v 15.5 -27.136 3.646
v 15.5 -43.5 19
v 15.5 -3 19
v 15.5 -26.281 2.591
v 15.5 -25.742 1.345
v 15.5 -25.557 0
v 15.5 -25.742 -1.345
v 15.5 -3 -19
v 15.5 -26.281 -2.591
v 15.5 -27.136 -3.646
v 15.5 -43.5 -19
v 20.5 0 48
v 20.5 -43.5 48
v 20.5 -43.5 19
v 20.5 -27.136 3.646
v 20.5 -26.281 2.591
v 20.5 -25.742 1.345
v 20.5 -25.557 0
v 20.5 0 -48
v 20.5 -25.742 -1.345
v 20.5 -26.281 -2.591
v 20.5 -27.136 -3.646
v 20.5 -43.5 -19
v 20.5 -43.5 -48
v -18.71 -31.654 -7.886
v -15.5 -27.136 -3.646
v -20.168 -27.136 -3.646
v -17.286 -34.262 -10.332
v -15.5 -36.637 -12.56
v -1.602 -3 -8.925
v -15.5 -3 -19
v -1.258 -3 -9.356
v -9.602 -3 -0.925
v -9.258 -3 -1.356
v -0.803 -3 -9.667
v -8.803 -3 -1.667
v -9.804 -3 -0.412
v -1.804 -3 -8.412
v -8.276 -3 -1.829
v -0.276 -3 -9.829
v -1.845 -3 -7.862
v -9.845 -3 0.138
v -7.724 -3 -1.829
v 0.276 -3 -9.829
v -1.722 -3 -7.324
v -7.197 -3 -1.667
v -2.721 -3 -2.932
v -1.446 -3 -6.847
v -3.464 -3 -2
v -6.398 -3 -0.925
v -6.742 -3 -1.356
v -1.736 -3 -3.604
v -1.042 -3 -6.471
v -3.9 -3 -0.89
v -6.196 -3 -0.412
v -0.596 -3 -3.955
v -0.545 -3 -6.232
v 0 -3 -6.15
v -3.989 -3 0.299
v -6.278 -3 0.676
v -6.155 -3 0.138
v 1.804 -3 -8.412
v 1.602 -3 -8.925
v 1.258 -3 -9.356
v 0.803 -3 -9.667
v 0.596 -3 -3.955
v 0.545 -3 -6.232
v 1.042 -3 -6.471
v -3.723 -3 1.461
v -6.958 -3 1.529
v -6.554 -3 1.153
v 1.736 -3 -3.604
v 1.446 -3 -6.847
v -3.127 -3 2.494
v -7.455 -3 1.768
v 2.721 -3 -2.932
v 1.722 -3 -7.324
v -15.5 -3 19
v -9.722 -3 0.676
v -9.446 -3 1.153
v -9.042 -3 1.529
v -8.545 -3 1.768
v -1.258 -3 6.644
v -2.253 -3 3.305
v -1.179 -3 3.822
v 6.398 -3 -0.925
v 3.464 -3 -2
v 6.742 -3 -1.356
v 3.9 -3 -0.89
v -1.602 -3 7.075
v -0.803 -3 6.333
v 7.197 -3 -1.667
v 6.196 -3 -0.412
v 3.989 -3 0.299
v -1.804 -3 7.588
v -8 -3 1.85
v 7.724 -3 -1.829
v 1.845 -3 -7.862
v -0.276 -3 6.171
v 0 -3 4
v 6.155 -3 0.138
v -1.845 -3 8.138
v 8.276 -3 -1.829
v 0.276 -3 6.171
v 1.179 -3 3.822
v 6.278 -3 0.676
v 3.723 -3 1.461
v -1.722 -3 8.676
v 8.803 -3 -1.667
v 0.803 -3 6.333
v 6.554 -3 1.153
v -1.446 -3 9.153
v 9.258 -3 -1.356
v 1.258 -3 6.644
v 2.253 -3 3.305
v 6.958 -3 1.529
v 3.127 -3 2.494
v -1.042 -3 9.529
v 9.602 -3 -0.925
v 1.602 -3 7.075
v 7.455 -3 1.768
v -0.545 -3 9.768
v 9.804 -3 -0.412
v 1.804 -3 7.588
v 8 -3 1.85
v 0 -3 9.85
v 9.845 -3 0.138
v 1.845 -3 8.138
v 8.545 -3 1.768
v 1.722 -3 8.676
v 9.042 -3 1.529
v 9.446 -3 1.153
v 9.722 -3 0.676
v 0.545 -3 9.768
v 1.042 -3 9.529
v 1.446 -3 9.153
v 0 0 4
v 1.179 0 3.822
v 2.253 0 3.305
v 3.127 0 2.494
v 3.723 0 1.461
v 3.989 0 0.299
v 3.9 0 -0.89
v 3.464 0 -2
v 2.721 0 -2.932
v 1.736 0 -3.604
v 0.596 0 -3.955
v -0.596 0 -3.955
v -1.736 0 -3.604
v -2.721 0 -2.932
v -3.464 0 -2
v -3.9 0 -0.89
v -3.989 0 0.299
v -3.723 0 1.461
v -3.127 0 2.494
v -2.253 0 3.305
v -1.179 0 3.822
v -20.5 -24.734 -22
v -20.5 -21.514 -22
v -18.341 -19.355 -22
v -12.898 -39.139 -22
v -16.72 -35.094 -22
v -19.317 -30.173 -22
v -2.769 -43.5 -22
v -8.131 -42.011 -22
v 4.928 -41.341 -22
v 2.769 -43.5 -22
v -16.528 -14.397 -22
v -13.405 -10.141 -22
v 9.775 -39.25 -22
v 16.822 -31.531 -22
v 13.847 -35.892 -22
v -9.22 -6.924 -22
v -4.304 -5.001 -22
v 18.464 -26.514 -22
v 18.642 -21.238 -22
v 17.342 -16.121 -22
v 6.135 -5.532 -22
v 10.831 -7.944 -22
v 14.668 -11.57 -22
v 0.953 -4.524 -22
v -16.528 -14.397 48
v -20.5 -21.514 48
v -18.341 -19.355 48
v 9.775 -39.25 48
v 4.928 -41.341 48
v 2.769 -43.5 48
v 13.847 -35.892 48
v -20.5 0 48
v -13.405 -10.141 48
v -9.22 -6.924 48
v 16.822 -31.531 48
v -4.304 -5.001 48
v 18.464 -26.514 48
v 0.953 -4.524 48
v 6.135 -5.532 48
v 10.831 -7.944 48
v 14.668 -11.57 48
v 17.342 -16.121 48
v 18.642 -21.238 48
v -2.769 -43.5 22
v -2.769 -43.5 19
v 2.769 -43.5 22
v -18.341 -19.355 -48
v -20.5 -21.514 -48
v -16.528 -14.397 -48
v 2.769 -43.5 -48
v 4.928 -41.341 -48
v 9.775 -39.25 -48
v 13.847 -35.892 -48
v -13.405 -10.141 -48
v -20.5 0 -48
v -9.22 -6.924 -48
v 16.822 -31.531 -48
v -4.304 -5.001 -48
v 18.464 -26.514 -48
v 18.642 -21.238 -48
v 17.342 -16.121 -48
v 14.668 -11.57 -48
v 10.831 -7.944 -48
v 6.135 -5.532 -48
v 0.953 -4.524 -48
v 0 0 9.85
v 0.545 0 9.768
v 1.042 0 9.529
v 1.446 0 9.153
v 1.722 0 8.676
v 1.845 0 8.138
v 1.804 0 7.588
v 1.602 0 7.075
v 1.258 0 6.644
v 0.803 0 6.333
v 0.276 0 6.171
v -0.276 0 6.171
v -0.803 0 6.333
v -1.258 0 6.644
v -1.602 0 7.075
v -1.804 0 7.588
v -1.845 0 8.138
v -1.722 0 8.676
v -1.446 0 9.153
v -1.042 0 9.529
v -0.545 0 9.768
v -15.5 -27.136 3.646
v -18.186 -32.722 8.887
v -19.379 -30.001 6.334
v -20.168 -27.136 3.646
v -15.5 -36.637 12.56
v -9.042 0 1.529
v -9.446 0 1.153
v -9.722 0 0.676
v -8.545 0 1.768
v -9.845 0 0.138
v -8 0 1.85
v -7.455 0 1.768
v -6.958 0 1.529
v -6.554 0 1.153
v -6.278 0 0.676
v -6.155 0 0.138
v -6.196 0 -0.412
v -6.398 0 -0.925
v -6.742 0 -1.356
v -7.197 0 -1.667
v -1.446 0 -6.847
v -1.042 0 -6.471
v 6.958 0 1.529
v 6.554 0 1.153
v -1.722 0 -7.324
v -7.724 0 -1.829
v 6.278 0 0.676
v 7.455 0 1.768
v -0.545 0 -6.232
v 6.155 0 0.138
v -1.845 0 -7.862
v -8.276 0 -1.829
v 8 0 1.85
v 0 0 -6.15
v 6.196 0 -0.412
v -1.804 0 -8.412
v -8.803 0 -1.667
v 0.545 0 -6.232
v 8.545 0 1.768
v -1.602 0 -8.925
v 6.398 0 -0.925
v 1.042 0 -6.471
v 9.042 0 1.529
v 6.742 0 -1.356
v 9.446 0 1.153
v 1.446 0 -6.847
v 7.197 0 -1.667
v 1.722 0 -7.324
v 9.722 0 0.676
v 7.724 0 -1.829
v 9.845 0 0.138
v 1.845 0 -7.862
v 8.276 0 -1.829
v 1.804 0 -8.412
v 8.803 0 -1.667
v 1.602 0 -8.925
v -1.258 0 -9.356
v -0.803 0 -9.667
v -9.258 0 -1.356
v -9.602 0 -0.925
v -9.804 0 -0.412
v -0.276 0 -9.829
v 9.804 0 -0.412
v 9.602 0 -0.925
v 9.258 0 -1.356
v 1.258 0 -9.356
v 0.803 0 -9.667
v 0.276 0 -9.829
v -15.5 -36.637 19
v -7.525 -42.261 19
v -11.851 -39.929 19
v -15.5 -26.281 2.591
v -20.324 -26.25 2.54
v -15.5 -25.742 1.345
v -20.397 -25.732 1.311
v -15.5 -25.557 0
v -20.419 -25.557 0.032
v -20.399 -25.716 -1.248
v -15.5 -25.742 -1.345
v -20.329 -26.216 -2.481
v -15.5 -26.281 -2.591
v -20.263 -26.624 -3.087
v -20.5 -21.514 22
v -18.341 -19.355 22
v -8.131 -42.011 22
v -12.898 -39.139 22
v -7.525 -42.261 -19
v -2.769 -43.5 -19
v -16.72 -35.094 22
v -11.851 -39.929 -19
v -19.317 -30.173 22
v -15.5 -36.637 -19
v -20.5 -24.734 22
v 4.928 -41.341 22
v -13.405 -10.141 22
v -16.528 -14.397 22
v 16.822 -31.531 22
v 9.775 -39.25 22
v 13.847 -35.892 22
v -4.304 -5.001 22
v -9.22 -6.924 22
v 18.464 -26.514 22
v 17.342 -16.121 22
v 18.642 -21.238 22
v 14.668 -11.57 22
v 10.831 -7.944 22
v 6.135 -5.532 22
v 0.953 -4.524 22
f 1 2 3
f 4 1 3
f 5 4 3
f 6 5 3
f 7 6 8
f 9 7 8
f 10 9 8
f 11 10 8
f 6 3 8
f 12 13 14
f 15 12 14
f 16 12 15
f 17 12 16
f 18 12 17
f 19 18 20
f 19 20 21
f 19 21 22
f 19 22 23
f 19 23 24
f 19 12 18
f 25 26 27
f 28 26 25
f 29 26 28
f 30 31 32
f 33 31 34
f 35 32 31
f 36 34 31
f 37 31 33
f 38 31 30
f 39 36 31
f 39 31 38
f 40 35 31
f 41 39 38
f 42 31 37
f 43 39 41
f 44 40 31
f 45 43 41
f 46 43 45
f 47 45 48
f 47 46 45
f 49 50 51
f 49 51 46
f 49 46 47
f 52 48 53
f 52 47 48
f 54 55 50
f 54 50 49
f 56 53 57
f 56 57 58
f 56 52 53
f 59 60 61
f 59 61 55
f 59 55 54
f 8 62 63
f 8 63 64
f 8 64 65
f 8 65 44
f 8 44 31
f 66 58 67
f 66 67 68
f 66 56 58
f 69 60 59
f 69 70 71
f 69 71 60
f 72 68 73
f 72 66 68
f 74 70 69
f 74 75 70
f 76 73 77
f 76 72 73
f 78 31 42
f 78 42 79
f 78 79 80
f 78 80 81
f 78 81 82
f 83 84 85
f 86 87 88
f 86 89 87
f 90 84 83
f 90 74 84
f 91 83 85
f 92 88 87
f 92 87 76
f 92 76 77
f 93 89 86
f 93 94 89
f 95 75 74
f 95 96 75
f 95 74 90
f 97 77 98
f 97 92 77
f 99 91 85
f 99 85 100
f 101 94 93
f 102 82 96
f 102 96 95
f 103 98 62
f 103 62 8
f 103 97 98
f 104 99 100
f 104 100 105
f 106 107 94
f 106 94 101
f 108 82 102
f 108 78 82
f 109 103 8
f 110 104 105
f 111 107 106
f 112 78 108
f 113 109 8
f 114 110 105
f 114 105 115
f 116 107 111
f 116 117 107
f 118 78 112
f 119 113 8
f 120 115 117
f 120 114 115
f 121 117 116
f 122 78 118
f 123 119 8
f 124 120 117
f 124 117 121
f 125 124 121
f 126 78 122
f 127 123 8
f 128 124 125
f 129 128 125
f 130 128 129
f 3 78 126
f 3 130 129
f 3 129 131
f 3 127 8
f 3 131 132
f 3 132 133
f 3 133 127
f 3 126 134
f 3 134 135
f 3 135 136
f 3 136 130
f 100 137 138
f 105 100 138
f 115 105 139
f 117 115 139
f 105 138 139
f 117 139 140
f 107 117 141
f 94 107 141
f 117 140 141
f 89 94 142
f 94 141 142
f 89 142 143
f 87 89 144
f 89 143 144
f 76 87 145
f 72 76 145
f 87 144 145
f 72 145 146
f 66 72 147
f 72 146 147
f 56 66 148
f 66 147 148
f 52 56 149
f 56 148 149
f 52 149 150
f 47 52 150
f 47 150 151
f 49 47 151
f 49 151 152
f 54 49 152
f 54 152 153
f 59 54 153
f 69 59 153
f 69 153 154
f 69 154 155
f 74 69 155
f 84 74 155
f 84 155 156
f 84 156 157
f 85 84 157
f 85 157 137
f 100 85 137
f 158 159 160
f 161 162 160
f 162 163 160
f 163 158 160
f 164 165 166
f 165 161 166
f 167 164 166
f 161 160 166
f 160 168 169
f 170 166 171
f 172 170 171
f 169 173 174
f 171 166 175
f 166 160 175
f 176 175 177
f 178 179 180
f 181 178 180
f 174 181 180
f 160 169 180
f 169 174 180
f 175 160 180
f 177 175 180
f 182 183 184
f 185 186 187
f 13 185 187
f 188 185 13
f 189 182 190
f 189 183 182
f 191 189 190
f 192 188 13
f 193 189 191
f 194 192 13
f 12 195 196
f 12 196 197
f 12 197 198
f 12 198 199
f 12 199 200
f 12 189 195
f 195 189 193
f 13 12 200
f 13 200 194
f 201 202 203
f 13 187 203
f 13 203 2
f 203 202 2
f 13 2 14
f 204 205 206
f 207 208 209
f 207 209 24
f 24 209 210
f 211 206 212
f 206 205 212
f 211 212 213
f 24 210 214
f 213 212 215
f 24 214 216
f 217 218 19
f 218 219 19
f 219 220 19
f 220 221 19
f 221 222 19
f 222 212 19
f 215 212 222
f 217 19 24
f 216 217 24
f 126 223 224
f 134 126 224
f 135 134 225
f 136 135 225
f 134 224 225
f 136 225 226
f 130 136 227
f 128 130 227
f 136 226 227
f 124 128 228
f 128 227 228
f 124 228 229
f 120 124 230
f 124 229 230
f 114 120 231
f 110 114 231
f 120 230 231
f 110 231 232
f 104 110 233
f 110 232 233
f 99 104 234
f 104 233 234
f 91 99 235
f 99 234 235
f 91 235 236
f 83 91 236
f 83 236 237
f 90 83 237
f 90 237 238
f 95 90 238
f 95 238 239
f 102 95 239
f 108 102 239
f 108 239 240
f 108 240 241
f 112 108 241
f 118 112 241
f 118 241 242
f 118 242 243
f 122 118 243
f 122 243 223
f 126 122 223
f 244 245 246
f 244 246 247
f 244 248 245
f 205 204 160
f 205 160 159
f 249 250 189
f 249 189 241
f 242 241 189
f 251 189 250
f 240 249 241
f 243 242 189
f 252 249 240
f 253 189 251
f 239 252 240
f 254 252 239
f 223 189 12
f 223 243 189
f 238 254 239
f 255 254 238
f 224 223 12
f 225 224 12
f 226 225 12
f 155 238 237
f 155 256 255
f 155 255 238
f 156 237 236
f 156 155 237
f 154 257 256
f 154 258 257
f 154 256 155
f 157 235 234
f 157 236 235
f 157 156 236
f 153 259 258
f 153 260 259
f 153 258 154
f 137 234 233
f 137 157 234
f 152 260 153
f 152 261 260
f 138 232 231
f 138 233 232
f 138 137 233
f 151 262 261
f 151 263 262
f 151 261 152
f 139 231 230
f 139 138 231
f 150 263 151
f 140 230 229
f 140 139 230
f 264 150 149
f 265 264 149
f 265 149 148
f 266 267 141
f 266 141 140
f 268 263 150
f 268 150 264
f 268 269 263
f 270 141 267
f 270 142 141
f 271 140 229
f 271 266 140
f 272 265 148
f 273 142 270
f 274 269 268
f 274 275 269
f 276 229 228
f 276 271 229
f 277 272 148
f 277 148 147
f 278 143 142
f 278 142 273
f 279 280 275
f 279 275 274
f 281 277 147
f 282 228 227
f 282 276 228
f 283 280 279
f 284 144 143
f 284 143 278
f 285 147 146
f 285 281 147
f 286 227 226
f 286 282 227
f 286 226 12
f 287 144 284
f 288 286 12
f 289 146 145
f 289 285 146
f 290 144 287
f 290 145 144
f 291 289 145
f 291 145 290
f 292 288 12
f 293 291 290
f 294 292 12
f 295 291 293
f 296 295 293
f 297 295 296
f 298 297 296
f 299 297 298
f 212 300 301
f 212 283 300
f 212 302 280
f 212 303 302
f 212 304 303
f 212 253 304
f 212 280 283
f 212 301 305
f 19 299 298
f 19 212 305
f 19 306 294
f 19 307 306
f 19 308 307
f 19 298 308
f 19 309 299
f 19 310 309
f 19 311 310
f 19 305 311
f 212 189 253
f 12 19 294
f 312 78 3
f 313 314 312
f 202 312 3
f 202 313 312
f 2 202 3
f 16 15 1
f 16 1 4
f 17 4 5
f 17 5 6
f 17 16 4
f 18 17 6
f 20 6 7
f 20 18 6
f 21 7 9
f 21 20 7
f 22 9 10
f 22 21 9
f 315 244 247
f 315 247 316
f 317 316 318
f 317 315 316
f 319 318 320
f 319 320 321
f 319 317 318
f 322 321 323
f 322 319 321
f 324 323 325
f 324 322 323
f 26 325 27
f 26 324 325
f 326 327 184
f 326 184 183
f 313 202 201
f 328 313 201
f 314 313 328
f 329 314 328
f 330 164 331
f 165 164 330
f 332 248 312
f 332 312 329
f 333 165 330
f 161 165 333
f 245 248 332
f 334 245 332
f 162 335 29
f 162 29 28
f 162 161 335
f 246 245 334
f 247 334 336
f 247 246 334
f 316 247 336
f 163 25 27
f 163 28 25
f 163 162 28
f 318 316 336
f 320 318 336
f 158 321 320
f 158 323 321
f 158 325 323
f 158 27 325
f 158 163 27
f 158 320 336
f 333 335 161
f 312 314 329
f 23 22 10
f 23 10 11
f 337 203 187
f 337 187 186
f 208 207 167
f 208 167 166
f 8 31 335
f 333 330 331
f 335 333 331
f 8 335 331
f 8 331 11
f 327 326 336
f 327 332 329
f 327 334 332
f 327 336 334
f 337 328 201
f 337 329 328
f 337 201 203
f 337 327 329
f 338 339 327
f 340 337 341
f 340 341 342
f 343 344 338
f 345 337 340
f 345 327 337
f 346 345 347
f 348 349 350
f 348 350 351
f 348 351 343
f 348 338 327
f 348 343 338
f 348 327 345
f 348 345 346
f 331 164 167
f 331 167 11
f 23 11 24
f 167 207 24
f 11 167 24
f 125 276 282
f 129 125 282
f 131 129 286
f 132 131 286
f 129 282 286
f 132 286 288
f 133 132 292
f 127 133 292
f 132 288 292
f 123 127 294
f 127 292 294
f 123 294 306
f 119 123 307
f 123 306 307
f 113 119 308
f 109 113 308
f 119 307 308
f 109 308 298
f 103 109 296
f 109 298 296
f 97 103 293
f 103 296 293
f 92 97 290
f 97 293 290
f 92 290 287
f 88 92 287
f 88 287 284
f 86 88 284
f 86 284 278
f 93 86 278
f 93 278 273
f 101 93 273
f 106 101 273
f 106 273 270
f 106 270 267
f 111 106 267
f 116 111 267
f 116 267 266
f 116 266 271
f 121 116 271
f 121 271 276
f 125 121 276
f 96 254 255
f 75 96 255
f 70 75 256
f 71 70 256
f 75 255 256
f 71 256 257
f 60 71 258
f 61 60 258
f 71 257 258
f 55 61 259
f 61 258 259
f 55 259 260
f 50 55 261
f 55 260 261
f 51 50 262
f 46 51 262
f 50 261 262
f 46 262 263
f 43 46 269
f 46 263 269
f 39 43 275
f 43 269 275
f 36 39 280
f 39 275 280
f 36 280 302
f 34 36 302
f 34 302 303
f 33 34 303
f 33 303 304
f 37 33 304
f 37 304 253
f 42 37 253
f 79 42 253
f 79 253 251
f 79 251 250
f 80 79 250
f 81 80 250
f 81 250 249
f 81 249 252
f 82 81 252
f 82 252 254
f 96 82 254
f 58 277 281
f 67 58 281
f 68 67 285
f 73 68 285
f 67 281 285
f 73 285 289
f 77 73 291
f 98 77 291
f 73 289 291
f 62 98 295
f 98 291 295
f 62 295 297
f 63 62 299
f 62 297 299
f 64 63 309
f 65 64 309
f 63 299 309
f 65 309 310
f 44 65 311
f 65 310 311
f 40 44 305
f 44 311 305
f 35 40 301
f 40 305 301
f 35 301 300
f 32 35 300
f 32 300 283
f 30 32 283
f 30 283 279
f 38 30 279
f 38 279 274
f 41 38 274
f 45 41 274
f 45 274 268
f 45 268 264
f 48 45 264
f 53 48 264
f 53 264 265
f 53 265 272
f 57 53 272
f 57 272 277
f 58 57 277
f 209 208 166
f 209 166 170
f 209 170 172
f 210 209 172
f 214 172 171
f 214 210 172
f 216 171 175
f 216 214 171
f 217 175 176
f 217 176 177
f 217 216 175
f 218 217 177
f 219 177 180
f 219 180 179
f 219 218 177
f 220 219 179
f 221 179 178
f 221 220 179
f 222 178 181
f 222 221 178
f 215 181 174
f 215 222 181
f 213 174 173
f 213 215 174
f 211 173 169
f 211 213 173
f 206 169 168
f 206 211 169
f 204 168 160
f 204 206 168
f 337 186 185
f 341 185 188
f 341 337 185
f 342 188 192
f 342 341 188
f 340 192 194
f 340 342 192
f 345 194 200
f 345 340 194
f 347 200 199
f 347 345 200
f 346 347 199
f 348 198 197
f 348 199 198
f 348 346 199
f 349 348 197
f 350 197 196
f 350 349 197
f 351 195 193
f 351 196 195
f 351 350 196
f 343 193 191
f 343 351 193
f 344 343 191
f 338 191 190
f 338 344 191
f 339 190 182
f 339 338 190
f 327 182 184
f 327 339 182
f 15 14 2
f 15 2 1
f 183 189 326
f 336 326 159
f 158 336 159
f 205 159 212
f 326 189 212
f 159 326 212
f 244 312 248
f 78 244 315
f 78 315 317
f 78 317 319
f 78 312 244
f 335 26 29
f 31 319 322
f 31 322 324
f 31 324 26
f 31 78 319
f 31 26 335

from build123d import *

# Parameters (mm, degrees)
SKETCH1_W               = 41
SKETCH1_H               = 96
SKETCH1_R               = 4
SKETCH1_R_2             = 1.85
BOSS_EXTRUDE1_DEPTH     = 43.5
CUT_EXTRUDE1_DEPTH      = 108.370852656
CUT_EXTRUDE1_DEPTH_BACK = 26
CUT_EXTRUDE2_START      = -96
CUT_EXTRUDE2_DEPTH      = 26
SKETCH4_W               = 41
SKETCH4_H               = 38
CUT_EXTRUDE4_DEPTH      = 40.5
BOSS_EXTRUDE2_START     = 20.5
BOSS_EXTRUDE2_DEPTH     = 5
BOSS_EXTRUDE3_START     = -15.5
BOSS_EXTRUDE3_DEPTH     = 5
CUT_EXTRUDE5_START      = -44
CUT_EXTRUDE5_DEPTH      = 44


# Read off the part's stored shape, not the designer's step: Cut-Extrude5
with BuildPart() as part:
    # Sketch1 → Boss-Extrude1 (new body)
    with BuildSketch(Plane(origin=(0, 0, 0), x_dir=(1, 0, 0), z_dir=(0, 1, 0))):
        Rectangle(SKETCH1_W, SKETCH1_H)
        with Locations(Location((0, 0, 0), (0, 0, 270))):
            Circle(SKETCH1_R, mode=Mode.SUBTRACT)
        with Locations(Location((0, -8, 0), (0, 0, 270))):
            Circle(SKETCH1_R_2, mode=Mode.SUBTRACT)
        with Locations(Location((-8, 0, 0), (0, 0, 270))):
            Circle(SKETCH1_R_2, mode=Mode.SUBTRACT)
        with Locations(Location((0, 8, 0), (0, 0, 270))):
            Circle(SKETCH1_R_2, mode=Mode.SUBTRACT)
        with Locations(Location((8, 0, 0), (0, 0, 270))):
            Circle(SKETCH1_R_2, mode=Mode.SUBTRACT)
    extrude(amount=-BOSS_EXTRUDE1_DEPTH)

    # Sketch3 → Cut-Extrude1 (cut, two sides: drawn at the far end of the back side and taken through both)
    with BuildSketch(Plane.XY.offset(48).offset(-CUT_EXTRUDE1_DEPTH_BACK)):
        with BuildLine():
            Line((-18.340899032, -19.35462804), (-20.5, -21.513729008))
            Line((-20.5, -21.513729008), (-20.5, -43.5))
            Line((-20.5, -43.5), (2.768563004, -43.5))
            Line((2.768563004, -43.5), (4.927663972, -41.340899032))
            ThreePointArc((4.927663972, -41.340899032), (12.877412268, -9.621546189), (-18.340899032, -19.35462804))
        make_face()
    extrude(amount=CUT_EXTRUDE1_DEPTH + CUT_EXTRUDE1_DEPTH_BACK, mode=Mode.SUBTRACT)

    # Sketch3<4> → Cut-Extrude2 (cut)
    with BuildSketch(Plane.XY.offset(48).offset(CUT_EXTRUDE2_START)):
        with BuildLine():
            Line((-18.340899032, -19.35462804), (-20.5, -21.513729008))
            Line((-20.5, -21.513729008), (-20.5, -43.5))
            Line((-20.5, -43.5), (2.768563004, -43.5))
            Line((2.768563004, -43.5), (4.927663972, -41.340899032))
            ThreePointArc((4.927663972, -41.340899032), (12.877412268, -9.621546189), (-18.340899032, -19.35462804))
        make_face()
    extrude(amount=CUT_EXTRUDE2_DEPTH, mode=Mode.SUBTRACT)

    # Sketch4 → Cut-Extrude4 (cut)
    with BuildSketch(Plane.XZ.offset(43.5)):
        Rectangle(SKETCH4_W, SKETCH4_H)
    extrude(amount=-CUT_EXTRUDE4_DEPTH, mode=Mode.SUBTRACT)

    # Sketch5 → Boss-Extrude2 (add)
    with BuildSketch(Plane(origin=(0, 0, 0), x_dir=(0, 0, -1), z_dir=(1, 0, 0)).offset(BOSS_EXTRUDE2_START)):
        with BuildLine():
            Line((-19, -43.5), (-3.646281893, -27.13616886))
            ThreePointArc((-3.646281893, -27.13616886), (0, -25.557371624), (3.646281893, -27.13616886))
            Line((3.646281893, -27.13616886), (19, -43.5))
            Line((19, -43.5), (19, -3))
            Line((19, -3), (-19, -3))
            Line((-19, -3), (-19, -43.5))
        make_face()
    extrude(amount=-BOSS_EXTRUDE2_DEPTH)

    # Sketch5<2> → Boss-Extrude3 (add)
    with BuildSketch(Plane(origin=(0, 0, 0), x_dir=(0, 0, -1), z_dir=(1, 0, 0)).offset(BOSS_EXTRUDE3_START)):
        with BuildLine():
            Line((-19, -43.5), (-3.646281893, -27.13616886))
            ThreePointArc((-3.646281893, -27.13616886), (0, -25.557371624), (3.646281893, -27.13616886))
            Line((3.646281893, -27.13616886), (19, -43.5))
            Line((19, -43.5), (19, -3))
            Line((19, -3), (-19, -3))
            Line((-19, -3), (-19, -43.5))
        make_face()
    extrude(amount=-BOSS_EXTRUDE3_DEPTH)

    # Cut-Extrude5 outline → Cut-Extrude5 (cut)
    with BuildSketch(Plane.XY.offset(22).offset(CUT_EXTRUDE5_START)):
        with BuildLine():
            Line((-20.5, -43.5), (-2.768563004, -43.5))
            ThreePointArc((-2.768563004, -43.5), (-14.946344874, -37.246752593), (-20.5, -24.734423107))
            Line((-20.5, -24.734423107), (-20.5, -43.5))
        make_face()
    extrude(amount=CUT_EXTRUDE5_DEPTH, mode=Mode.SUBTRACT)


solid = part.part
